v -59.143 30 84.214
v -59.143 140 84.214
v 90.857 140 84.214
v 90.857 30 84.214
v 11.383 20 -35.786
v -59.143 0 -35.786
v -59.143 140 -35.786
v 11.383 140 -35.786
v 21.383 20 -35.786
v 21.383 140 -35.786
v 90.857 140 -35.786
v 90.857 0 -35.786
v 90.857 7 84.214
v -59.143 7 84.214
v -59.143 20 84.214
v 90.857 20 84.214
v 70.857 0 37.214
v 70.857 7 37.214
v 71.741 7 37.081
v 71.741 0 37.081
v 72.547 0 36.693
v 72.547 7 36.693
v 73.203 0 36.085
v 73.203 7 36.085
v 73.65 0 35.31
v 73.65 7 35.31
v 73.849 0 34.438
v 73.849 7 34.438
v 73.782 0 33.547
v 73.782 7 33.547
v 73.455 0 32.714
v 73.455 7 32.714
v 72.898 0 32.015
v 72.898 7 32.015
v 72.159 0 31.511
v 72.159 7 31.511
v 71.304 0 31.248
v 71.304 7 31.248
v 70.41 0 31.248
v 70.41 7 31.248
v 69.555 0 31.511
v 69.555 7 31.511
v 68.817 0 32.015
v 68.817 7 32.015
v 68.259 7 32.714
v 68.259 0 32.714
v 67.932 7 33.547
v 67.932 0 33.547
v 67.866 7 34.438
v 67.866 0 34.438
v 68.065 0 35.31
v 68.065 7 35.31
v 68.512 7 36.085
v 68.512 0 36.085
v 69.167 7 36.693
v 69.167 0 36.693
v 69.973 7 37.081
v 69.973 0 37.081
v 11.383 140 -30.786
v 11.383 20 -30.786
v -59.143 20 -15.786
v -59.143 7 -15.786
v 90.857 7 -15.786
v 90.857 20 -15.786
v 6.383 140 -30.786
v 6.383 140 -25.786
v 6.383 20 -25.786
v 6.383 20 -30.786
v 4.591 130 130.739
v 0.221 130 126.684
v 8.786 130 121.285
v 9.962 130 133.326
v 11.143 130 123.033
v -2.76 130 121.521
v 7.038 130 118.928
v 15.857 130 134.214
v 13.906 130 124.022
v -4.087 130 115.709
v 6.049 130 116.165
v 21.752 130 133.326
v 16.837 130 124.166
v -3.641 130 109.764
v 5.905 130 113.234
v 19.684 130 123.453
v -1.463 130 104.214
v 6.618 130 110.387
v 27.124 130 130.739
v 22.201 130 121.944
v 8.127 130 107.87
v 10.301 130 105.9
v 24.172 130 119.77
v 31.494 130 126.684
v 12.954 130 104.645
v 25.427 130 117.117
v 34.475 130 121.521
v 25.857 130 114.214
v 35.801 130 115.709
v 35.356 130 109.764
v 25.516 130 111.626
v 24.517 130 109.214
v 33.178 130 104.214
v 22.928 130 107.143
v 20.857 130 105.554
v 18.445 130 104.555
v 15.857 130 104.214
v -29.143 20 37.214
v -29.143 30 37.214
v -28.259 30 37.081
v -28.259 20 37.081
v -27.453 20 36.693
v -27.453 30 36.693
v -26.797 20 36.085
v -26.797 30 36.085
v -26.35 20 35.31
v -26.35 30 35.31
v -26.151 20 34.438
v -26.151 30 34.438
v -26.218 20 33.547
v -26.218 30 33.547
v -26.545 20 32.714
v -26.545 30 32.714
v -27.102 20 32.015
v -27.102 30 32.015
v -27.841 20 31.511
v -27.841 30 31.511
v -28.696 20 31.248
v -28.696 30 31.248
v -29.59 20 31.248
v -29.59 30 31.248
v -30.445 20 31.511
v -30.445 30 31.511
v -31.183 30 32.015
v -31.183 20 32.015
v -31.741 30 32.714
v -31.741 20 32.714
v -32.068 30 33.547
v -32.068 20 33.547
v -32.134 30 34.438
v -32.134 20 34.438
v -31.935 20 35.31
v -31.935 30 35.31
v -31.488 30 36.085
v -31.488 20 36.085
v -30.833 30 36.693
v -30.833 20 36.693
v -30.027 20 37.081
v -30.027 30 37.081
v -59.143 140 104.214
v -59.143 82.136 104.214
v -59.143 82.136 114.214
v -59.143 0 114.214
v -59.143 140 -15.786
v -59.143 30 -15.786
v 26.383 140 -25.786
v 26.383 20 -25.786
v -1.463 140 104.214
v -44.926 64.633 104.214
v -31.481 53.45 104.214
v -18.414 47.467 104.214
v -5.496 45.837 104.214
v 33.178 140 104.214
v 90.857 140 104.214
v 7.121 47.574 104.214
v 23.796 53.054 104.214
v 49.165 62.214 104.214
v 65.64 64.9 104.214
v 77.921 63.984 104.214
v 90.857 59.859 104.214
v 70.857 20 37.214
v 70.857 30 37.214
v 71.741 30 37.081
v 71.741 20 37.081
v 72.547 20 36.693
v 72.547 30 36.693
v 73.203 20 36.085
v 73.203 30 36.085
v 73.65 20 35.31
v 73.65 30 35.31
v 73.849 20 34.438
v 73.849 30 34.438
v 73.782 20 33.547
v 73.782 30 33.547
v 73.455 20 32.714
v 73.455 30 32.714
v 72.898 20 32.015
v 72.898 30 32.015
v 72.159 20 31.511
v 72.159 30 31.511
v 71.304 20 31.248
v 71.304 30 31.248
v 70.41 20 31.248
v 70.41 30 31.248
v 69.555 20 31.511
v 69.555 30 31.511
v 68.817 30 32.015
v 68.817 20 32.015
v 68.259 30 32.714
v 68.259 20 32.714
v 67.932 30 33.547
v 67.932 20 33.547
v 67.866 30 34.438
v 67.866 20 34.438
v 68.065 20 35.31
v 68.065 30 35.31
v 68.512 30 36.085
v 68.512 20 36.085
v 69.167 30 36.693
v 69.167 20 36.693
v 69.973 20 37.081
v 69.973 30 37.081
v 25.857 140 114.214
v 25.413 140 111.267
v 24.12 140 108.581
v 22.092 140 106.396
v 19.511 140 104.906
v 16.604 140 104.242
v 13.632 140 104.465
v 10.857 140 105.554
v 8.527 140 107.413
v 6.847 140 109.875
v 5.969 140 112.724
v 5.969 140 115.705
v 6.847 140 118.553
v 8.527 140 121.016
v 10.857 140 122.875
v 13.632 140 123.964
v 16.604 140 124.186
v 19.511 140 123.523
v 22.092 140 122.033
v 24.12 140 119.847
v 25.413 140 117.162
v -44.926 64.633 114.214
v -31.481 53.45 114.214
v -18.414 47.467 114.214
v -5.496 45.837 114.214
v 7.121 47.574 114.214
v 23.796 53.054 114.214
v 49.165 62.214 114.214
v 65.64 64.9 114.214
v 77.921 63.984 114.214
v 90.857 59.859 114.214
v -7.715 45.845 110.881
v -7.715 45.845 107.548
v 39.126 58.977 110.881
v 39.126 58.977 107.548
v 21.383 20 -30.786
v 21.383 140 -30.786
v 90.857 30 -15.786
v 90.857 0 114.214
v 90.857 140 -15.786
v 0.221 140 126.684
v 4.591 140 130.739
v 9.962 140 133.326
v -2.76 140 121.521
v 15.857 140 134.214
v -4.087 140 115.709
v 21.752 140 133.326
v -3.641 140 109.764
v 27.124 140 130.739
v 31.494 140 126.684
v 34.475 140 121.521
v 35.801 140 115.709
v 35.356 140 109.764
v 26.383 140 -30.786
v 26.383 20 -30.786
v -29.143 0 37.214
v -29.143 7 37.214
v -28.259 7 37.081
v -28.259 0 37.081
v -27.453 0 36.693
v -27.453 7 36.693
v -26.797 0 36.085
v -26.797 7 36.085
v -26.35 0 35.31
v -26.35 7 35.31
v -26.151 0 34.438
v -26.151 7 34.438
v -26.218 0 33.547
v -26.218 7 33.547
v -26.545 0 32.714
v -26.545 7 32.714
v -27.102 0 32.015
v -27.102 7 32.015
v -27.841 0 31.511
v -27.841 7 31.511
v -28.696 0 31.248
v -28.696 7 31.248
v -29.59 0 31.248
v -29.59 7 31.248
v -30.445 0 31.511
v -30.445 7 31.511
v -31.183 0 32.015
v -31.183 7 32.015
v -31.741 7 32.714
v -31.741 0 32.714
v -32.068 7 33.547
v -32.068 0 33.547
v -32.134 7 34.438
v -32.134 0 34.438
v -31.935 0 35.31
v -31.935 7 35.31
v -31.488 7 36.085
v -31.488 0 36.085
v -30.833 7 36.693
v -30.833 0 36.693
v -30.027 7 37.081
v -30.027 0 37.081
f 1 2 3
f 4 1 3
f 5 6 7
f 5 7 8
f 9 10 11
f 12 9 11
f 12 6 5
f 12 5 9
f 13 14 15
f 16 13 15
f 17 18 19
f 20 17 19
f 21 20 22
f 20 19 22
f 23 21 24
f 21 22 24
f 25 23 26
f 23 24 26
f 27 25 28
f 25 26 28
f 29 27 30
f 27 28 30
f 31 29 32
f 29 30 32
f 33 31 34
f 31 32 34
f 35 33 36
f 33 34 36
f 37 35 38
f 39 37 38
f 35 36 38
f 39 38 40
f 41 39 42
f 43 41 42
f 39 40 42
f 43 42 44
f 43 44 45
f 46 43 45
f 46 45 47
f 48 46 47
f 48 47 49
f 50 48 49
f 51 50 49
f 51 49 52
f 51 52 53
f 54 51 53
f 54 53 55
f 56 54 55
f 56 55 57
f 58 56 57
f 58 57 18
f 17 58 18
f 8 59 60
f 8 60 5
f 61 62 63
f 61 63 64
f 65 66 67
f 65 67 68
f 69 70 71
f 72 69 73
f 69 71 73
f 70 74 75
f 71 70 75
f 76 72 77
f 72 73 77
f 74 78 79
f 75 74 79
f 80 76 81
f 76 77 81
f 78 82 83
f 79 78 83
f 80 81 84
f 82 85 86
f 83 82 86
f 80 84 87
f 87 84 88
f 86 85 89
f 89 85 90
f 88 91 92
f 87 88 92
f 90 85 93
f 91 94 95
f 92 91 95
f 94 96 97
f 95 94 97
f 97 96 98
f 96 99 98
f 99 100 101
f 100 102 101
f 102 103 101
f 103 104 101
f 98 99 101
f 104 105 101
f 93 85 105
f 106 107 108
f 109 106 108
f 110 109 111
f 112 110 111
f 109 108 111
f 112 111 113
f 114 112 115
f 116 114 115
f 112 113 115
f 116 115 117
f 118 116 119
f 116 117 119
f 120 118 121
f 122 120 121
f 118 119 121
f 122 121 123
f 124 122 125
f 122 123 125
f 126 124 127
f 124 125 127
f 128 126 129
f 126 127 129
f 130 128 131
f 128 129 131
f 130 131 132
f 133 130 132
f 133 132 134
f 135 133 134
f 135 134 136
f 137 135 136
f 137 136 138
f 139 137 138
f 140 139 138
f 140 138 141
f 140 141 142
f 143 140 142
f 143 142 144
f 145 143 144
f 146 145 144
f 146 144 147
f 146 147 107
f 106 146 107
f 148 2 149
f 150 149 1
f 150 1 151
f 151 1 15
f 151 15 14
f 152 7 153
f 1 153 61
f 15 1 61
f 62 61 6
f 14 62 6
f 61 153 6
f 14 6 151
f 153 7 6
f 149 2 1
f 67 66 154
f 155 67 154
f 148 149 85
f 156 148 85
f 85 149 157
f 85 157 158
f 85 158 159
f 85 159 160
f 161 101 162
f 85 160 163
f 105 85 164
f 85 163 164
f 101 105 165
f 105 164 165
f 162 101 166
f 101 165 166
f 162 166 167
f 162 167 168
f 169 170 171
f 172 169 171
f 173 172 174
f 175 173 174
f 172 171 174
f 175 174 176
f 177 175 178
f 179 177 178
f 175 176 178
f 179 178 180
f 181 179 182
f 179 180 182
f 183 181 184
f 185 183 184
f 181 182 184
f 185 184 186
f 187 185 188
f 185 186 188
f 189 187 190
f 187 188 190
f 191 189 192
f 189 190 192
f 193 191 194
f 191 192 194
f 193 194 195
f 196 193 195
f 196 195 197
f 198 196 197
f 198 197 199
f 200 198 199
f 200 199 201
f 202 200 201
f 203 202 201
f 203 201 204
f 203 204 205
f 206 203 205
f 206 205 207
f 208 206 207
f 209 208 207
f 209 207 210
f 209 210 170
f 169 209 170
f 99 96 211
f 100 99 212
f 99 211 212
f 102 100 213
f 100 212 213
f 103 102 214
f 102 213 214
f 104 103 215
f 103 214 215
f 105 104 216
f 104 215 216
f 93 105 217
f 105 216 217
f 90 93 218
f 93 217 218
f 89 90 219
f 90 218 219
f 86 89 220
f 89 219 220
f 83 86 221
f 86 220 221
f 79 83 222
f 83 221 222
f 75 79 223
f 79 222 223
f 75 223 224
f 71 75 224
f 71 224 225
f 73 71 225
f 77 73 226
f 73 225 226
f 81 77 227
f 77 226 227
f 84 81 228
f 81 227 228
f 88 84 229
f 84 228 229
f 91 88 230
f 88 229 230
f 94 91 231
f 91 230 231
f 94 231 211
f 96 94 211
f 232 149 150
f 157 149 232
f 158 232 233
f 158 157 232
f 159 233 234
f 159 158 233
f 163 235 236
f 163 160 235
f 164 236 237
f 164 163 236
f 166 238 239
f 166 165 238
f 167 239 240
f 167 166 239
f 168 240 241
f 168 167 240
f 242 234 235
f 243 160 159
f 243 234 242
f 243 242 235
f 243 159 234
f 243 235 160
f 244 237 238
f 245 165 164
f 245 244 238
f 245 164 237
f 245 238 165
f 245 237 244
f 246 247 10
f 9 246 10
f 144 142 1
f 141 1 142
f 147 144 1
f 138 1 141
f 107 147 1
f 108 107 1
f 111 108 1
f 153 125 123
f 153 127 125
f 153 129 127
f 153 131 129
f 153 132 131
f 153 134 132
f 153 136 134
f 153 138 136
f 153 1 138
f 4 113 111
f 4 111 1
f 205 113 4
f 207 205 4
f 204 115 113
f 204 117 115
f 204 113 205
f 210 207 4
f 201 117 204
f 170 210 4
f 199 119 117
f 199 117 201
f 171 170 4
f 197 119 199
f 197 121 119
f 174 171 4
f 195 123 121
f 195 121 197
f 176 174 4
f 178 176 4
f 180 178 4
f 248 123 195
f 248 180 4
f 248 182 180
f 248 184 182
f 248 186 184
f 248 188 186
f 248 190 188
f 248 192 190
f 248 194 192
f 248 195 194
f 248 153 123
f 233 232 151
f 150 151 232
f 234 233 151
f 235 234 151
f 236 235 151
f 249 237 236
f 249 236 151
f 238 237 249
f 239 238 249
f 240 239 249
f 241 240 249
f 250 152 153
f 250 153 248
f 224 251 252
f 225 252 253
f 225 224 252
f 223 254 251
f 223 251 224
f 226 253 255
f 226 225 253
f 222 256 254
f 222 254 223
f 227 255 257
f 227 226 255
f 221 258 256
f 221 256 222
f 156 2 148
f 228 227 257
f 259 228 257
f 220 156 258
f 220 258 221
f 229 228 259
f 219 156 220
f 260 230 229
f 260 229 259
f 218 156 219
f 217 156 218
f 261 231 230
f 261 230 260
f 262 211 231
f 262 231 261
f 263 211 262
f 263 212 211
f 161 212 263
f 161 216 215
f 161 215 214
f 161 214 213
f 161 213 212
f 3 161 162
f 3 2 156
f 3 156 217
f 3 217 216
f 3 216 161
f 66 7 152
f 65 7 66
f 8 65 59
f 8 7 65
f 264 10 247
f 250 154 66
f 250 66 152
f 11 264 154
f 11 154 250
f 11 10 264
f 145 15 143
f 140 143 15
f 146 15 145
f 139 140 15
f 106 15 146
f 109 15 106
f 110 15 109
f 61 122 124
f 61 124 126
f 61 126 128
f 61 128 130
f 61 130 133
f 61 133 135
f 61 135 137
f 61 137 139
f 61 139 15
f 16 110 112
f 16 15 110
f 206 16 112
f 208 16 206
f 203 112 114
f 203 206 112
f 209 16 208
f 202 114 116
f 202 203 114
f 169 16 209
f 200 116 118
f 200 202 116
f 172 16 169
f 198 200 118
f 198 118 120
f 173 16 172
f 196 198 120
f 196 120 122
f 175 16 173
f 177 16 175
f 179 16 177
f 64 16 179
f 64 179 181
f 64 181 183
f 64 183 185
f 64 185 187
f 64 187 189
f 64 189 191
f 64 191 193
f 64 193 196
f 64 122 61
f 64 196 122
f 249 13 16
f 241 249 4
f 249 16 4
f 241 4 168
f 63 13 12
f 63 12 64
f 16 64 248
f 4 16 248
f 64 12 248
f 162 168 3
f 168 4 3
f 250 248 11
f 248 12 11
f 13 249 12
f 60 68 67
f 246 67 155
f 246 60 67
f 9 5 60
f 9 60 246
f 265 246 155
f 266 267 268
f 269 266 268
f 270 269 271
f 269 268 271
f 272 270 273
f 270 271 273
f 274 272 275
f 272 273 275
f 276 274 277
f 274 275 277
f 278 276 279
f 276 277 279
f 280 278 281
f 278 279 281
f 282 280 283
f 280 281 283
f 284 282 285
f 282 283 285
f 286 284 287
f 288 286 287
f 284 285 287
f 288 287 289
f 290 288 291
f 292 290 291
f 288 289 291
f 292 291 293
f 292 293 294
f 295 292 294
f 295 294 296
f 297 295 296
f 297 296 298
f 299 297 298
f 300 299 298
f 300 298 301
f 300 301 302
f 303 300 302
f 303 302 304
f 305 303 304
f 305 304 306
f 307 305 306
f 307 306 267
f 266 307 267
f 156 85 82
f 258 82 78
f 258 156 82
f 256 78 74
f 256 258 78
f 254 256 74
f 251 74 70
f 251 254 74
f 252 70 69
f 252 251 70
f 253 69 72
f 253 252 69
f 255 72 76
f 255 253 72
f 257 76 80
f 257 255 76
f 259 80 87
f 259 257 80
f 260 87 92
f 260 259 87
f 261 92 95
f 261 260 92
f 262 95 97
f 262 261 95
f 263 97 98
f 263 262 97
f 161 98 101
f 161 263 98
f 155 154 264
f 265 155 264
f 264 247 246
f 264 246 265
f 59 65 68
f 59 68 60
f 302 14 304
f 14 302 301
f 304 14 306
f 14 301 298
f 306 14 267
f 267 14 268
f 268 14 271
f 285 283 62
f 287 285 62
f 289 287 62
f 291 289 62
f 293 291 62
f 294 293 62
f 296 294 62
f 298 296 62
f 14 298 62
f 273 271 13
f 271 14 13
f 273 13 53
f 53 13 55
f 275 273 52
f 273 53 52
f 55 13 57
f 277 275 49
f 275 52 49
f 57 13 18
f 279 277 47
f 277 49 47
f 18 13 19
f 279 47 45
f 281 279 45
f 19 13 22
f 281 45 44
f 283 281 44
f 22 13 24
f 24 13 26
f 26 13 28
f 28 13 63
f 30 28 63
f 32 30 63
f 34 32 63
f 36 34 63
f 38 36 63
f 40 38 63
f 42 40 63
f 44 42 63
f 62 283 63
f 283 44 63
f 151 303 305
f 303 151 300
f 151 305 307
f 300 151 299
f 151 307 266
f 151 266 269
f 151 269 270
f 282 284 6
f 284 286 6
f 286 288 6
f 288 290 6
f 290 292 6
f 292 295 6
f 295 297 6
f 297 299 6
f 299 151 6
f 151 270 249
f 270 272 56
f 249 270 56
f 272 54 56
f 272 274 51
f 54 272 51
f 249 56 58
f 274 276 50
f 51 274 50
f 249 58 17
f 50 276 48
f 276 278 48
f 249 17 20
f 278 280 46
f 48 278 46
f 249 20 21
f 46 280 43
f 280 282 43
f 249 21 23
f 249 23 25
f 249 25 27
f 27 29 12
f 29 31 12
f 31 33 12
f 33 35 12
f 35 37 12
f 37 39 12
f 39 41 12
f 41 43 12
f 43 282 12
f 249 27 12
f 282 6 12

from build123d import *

# Parameters (mm, degrees)
SKETCH_2_W          = 150
SKETCH_2_H          = 140
EXTRUDE_1_DEPTH     = 140
SKETCH_3_W          = 150
SKETCH_3_H          = 100
CUT_EXTRUDE_1_DEPTH = 110
SKETCH_4_W          = 100
SKETCH_4_H          = 13
CUT_EXTRUDE_2_DEPTH = 231.131739112
SKETCH_5_R          = 3
CUT_EXTRUDE_3_DEPTH = 50
SKETCH_6_R          = 3
CUT_EXTRUDE_4_DEPTH = 177.679477459
SKETCH_7_R          = 20
SKETCH_7_R_2        = 10
EXTRUDE_1_2_DEPTH   = 10
SKETCH_8_W          = 10
SKETCH_8_H          = 10
CUT_EXTRUDE_5_DEPTH = 120
SKETCH_10_W         = 20
SKETCH_10_H         = 5
CUT_EXTRUDE_7_DEPTH = 120
EXTRUDE_2_DEPTH     = 10


with BuildPart() as part:
    # 草圖2 → Extrude 1 (new body)
    with BuildSketch(Plane(origin=(0, 0, 0), x_dir=(1, 0, 0), z_dir=(0, 1, 0))):
        with Locations((15.857142857, -34.214285714)):
            Rectangle(SKETCH_2_W, SKETCH_2_H)
    extrude(amount=EXTRUDE_1_DEPTH)

    # 草圖3 → 除料-伸長1 (cut)
    with BuildSketch(Plane(origin=(0, 140, 0), x_dir=(1, 0, 0), z_dir=(0, 1, 0))):
        with Locations((15.857142857, -34.214285714)):
            Rectangle(SKETCH_3_W, SKETCH_3_H)
    extrude(amount=-CUT_EXTRUDE_1_DEPTH, mode=Mode.SUBTRACT)

    # 草圖4 → 除料-伸長2 (cut, through all)
    with BuildSketch(Plane(origin=(90.857142857, 0, 0), x_dir=(0, 0, -1), z_dir=(1, 0, 0))):
        with Locations((-34.214285714, 13.5)):
            Rectangle(SKETCH_4_W, SKETCH_4_H)
    extrude(amount=-CUT_EXTRUDE_2_DEPTH, mode=Mode.SUBTRACT)

    # 草圖5 → 除料-伸長3 (cut)
    with BuildSketch(Plane(origin=(0, 30, 0), x_dir=(1, 0, 0), z_dir=(0, 1, 0))):
        with Locations(Location((70.857142857, -34.214285714, 0), (0, 0, 270))):
            Circle(SKETCH_5_R)
    extrude(amount=-CUT_EXTRUDE_3_DEPTH, mode=Mode.SUBTRACT)

    # 草圖6 → 除料-伸長4 (cut, through all)
    with BuildSketch(Plane(origin=(0, 30, 0), x_dir=(1, 0, 0), z_dir=(0, 1, 0))):
        with Locations(Location((-29.142857143, -34.214285714, 0), (0, 0, 270))):
            Circle(SKETCH_6_R)
    extrude(amount=-CUT_EXTRUDE_4_DEPTH, mode=Mode.SUBTRACT)

    # 草圖7 → Extrude 1 2 (add)
    with BuildSketch(Plane(origin=(0, 140, 0), x_dir=(1, 0, 0), z_dir=(0, 1, 0))):
        with Locations((15.857142857, -114.214285714)):
            Circle(SKETCH_7_R)
        with Locations((15.857142857, -114.214285714)):
            Circle(SKETCH_7_R_2, mode=Mode.SUBTRACT)
    extrude(amount=-EXTRUDE_1_2_DEPTH)

    # 草圖8 → 除料-伸長5 (cut)
    with BuildSketch(Plane(origin=(0, 140, 0), x_dir=(1, 0, 0), z_dir=(0, 1, 0))):
        with Locations((16.382857537, 30.785714286)):
            Rectangle(SKETCH_8_W, SKETCH_8_H)
    extrude(amount=-CUT_EXTRUDE_5_DEPTH, mode=Mode.SUBTRACT)

    # 草圖10 → 除料-伸長7 (cut)
    with BuildSketch(Plane(origin=(0, 140, 0), x_dir=(1, 0, 0), z_dir=(0, 1, 0))):
        with Locations((16.382857537, 28.285714286)):
            Rectangle(SKETCH_10_W, SKETCH_10_H)
    extrude(amount=-CUT_EXTRUDE_7_DEPTH, mode=Mode.SUBTRACT)

    # 草圖11 → 填料-伸長2 (add)
    with BuildSketch(Plane.XY.offset(104.214285714)):
        with BuildLine():
            Line((-59.142857143, 82.136050004), (-59.142857143, 0))
            Line((-59.142857143, 0), (90.857142857, 0))
            Line((90.857142857, 0), (90.857142857, 59.85891712))
            add(Edge.make_bspline(
                [(-59.142857143, 82.136050004), (-2.260684415, 0.574504188), (33.520042851, 85.660046613), (90.857142857, 59.85891712)],
                knots=[0, 0, 0, 0, 1, 1, 1, 1], degree=3))
        make_face()
    extrude(amount=EXTRUDE_2_DEPTH)


solid = part.part
